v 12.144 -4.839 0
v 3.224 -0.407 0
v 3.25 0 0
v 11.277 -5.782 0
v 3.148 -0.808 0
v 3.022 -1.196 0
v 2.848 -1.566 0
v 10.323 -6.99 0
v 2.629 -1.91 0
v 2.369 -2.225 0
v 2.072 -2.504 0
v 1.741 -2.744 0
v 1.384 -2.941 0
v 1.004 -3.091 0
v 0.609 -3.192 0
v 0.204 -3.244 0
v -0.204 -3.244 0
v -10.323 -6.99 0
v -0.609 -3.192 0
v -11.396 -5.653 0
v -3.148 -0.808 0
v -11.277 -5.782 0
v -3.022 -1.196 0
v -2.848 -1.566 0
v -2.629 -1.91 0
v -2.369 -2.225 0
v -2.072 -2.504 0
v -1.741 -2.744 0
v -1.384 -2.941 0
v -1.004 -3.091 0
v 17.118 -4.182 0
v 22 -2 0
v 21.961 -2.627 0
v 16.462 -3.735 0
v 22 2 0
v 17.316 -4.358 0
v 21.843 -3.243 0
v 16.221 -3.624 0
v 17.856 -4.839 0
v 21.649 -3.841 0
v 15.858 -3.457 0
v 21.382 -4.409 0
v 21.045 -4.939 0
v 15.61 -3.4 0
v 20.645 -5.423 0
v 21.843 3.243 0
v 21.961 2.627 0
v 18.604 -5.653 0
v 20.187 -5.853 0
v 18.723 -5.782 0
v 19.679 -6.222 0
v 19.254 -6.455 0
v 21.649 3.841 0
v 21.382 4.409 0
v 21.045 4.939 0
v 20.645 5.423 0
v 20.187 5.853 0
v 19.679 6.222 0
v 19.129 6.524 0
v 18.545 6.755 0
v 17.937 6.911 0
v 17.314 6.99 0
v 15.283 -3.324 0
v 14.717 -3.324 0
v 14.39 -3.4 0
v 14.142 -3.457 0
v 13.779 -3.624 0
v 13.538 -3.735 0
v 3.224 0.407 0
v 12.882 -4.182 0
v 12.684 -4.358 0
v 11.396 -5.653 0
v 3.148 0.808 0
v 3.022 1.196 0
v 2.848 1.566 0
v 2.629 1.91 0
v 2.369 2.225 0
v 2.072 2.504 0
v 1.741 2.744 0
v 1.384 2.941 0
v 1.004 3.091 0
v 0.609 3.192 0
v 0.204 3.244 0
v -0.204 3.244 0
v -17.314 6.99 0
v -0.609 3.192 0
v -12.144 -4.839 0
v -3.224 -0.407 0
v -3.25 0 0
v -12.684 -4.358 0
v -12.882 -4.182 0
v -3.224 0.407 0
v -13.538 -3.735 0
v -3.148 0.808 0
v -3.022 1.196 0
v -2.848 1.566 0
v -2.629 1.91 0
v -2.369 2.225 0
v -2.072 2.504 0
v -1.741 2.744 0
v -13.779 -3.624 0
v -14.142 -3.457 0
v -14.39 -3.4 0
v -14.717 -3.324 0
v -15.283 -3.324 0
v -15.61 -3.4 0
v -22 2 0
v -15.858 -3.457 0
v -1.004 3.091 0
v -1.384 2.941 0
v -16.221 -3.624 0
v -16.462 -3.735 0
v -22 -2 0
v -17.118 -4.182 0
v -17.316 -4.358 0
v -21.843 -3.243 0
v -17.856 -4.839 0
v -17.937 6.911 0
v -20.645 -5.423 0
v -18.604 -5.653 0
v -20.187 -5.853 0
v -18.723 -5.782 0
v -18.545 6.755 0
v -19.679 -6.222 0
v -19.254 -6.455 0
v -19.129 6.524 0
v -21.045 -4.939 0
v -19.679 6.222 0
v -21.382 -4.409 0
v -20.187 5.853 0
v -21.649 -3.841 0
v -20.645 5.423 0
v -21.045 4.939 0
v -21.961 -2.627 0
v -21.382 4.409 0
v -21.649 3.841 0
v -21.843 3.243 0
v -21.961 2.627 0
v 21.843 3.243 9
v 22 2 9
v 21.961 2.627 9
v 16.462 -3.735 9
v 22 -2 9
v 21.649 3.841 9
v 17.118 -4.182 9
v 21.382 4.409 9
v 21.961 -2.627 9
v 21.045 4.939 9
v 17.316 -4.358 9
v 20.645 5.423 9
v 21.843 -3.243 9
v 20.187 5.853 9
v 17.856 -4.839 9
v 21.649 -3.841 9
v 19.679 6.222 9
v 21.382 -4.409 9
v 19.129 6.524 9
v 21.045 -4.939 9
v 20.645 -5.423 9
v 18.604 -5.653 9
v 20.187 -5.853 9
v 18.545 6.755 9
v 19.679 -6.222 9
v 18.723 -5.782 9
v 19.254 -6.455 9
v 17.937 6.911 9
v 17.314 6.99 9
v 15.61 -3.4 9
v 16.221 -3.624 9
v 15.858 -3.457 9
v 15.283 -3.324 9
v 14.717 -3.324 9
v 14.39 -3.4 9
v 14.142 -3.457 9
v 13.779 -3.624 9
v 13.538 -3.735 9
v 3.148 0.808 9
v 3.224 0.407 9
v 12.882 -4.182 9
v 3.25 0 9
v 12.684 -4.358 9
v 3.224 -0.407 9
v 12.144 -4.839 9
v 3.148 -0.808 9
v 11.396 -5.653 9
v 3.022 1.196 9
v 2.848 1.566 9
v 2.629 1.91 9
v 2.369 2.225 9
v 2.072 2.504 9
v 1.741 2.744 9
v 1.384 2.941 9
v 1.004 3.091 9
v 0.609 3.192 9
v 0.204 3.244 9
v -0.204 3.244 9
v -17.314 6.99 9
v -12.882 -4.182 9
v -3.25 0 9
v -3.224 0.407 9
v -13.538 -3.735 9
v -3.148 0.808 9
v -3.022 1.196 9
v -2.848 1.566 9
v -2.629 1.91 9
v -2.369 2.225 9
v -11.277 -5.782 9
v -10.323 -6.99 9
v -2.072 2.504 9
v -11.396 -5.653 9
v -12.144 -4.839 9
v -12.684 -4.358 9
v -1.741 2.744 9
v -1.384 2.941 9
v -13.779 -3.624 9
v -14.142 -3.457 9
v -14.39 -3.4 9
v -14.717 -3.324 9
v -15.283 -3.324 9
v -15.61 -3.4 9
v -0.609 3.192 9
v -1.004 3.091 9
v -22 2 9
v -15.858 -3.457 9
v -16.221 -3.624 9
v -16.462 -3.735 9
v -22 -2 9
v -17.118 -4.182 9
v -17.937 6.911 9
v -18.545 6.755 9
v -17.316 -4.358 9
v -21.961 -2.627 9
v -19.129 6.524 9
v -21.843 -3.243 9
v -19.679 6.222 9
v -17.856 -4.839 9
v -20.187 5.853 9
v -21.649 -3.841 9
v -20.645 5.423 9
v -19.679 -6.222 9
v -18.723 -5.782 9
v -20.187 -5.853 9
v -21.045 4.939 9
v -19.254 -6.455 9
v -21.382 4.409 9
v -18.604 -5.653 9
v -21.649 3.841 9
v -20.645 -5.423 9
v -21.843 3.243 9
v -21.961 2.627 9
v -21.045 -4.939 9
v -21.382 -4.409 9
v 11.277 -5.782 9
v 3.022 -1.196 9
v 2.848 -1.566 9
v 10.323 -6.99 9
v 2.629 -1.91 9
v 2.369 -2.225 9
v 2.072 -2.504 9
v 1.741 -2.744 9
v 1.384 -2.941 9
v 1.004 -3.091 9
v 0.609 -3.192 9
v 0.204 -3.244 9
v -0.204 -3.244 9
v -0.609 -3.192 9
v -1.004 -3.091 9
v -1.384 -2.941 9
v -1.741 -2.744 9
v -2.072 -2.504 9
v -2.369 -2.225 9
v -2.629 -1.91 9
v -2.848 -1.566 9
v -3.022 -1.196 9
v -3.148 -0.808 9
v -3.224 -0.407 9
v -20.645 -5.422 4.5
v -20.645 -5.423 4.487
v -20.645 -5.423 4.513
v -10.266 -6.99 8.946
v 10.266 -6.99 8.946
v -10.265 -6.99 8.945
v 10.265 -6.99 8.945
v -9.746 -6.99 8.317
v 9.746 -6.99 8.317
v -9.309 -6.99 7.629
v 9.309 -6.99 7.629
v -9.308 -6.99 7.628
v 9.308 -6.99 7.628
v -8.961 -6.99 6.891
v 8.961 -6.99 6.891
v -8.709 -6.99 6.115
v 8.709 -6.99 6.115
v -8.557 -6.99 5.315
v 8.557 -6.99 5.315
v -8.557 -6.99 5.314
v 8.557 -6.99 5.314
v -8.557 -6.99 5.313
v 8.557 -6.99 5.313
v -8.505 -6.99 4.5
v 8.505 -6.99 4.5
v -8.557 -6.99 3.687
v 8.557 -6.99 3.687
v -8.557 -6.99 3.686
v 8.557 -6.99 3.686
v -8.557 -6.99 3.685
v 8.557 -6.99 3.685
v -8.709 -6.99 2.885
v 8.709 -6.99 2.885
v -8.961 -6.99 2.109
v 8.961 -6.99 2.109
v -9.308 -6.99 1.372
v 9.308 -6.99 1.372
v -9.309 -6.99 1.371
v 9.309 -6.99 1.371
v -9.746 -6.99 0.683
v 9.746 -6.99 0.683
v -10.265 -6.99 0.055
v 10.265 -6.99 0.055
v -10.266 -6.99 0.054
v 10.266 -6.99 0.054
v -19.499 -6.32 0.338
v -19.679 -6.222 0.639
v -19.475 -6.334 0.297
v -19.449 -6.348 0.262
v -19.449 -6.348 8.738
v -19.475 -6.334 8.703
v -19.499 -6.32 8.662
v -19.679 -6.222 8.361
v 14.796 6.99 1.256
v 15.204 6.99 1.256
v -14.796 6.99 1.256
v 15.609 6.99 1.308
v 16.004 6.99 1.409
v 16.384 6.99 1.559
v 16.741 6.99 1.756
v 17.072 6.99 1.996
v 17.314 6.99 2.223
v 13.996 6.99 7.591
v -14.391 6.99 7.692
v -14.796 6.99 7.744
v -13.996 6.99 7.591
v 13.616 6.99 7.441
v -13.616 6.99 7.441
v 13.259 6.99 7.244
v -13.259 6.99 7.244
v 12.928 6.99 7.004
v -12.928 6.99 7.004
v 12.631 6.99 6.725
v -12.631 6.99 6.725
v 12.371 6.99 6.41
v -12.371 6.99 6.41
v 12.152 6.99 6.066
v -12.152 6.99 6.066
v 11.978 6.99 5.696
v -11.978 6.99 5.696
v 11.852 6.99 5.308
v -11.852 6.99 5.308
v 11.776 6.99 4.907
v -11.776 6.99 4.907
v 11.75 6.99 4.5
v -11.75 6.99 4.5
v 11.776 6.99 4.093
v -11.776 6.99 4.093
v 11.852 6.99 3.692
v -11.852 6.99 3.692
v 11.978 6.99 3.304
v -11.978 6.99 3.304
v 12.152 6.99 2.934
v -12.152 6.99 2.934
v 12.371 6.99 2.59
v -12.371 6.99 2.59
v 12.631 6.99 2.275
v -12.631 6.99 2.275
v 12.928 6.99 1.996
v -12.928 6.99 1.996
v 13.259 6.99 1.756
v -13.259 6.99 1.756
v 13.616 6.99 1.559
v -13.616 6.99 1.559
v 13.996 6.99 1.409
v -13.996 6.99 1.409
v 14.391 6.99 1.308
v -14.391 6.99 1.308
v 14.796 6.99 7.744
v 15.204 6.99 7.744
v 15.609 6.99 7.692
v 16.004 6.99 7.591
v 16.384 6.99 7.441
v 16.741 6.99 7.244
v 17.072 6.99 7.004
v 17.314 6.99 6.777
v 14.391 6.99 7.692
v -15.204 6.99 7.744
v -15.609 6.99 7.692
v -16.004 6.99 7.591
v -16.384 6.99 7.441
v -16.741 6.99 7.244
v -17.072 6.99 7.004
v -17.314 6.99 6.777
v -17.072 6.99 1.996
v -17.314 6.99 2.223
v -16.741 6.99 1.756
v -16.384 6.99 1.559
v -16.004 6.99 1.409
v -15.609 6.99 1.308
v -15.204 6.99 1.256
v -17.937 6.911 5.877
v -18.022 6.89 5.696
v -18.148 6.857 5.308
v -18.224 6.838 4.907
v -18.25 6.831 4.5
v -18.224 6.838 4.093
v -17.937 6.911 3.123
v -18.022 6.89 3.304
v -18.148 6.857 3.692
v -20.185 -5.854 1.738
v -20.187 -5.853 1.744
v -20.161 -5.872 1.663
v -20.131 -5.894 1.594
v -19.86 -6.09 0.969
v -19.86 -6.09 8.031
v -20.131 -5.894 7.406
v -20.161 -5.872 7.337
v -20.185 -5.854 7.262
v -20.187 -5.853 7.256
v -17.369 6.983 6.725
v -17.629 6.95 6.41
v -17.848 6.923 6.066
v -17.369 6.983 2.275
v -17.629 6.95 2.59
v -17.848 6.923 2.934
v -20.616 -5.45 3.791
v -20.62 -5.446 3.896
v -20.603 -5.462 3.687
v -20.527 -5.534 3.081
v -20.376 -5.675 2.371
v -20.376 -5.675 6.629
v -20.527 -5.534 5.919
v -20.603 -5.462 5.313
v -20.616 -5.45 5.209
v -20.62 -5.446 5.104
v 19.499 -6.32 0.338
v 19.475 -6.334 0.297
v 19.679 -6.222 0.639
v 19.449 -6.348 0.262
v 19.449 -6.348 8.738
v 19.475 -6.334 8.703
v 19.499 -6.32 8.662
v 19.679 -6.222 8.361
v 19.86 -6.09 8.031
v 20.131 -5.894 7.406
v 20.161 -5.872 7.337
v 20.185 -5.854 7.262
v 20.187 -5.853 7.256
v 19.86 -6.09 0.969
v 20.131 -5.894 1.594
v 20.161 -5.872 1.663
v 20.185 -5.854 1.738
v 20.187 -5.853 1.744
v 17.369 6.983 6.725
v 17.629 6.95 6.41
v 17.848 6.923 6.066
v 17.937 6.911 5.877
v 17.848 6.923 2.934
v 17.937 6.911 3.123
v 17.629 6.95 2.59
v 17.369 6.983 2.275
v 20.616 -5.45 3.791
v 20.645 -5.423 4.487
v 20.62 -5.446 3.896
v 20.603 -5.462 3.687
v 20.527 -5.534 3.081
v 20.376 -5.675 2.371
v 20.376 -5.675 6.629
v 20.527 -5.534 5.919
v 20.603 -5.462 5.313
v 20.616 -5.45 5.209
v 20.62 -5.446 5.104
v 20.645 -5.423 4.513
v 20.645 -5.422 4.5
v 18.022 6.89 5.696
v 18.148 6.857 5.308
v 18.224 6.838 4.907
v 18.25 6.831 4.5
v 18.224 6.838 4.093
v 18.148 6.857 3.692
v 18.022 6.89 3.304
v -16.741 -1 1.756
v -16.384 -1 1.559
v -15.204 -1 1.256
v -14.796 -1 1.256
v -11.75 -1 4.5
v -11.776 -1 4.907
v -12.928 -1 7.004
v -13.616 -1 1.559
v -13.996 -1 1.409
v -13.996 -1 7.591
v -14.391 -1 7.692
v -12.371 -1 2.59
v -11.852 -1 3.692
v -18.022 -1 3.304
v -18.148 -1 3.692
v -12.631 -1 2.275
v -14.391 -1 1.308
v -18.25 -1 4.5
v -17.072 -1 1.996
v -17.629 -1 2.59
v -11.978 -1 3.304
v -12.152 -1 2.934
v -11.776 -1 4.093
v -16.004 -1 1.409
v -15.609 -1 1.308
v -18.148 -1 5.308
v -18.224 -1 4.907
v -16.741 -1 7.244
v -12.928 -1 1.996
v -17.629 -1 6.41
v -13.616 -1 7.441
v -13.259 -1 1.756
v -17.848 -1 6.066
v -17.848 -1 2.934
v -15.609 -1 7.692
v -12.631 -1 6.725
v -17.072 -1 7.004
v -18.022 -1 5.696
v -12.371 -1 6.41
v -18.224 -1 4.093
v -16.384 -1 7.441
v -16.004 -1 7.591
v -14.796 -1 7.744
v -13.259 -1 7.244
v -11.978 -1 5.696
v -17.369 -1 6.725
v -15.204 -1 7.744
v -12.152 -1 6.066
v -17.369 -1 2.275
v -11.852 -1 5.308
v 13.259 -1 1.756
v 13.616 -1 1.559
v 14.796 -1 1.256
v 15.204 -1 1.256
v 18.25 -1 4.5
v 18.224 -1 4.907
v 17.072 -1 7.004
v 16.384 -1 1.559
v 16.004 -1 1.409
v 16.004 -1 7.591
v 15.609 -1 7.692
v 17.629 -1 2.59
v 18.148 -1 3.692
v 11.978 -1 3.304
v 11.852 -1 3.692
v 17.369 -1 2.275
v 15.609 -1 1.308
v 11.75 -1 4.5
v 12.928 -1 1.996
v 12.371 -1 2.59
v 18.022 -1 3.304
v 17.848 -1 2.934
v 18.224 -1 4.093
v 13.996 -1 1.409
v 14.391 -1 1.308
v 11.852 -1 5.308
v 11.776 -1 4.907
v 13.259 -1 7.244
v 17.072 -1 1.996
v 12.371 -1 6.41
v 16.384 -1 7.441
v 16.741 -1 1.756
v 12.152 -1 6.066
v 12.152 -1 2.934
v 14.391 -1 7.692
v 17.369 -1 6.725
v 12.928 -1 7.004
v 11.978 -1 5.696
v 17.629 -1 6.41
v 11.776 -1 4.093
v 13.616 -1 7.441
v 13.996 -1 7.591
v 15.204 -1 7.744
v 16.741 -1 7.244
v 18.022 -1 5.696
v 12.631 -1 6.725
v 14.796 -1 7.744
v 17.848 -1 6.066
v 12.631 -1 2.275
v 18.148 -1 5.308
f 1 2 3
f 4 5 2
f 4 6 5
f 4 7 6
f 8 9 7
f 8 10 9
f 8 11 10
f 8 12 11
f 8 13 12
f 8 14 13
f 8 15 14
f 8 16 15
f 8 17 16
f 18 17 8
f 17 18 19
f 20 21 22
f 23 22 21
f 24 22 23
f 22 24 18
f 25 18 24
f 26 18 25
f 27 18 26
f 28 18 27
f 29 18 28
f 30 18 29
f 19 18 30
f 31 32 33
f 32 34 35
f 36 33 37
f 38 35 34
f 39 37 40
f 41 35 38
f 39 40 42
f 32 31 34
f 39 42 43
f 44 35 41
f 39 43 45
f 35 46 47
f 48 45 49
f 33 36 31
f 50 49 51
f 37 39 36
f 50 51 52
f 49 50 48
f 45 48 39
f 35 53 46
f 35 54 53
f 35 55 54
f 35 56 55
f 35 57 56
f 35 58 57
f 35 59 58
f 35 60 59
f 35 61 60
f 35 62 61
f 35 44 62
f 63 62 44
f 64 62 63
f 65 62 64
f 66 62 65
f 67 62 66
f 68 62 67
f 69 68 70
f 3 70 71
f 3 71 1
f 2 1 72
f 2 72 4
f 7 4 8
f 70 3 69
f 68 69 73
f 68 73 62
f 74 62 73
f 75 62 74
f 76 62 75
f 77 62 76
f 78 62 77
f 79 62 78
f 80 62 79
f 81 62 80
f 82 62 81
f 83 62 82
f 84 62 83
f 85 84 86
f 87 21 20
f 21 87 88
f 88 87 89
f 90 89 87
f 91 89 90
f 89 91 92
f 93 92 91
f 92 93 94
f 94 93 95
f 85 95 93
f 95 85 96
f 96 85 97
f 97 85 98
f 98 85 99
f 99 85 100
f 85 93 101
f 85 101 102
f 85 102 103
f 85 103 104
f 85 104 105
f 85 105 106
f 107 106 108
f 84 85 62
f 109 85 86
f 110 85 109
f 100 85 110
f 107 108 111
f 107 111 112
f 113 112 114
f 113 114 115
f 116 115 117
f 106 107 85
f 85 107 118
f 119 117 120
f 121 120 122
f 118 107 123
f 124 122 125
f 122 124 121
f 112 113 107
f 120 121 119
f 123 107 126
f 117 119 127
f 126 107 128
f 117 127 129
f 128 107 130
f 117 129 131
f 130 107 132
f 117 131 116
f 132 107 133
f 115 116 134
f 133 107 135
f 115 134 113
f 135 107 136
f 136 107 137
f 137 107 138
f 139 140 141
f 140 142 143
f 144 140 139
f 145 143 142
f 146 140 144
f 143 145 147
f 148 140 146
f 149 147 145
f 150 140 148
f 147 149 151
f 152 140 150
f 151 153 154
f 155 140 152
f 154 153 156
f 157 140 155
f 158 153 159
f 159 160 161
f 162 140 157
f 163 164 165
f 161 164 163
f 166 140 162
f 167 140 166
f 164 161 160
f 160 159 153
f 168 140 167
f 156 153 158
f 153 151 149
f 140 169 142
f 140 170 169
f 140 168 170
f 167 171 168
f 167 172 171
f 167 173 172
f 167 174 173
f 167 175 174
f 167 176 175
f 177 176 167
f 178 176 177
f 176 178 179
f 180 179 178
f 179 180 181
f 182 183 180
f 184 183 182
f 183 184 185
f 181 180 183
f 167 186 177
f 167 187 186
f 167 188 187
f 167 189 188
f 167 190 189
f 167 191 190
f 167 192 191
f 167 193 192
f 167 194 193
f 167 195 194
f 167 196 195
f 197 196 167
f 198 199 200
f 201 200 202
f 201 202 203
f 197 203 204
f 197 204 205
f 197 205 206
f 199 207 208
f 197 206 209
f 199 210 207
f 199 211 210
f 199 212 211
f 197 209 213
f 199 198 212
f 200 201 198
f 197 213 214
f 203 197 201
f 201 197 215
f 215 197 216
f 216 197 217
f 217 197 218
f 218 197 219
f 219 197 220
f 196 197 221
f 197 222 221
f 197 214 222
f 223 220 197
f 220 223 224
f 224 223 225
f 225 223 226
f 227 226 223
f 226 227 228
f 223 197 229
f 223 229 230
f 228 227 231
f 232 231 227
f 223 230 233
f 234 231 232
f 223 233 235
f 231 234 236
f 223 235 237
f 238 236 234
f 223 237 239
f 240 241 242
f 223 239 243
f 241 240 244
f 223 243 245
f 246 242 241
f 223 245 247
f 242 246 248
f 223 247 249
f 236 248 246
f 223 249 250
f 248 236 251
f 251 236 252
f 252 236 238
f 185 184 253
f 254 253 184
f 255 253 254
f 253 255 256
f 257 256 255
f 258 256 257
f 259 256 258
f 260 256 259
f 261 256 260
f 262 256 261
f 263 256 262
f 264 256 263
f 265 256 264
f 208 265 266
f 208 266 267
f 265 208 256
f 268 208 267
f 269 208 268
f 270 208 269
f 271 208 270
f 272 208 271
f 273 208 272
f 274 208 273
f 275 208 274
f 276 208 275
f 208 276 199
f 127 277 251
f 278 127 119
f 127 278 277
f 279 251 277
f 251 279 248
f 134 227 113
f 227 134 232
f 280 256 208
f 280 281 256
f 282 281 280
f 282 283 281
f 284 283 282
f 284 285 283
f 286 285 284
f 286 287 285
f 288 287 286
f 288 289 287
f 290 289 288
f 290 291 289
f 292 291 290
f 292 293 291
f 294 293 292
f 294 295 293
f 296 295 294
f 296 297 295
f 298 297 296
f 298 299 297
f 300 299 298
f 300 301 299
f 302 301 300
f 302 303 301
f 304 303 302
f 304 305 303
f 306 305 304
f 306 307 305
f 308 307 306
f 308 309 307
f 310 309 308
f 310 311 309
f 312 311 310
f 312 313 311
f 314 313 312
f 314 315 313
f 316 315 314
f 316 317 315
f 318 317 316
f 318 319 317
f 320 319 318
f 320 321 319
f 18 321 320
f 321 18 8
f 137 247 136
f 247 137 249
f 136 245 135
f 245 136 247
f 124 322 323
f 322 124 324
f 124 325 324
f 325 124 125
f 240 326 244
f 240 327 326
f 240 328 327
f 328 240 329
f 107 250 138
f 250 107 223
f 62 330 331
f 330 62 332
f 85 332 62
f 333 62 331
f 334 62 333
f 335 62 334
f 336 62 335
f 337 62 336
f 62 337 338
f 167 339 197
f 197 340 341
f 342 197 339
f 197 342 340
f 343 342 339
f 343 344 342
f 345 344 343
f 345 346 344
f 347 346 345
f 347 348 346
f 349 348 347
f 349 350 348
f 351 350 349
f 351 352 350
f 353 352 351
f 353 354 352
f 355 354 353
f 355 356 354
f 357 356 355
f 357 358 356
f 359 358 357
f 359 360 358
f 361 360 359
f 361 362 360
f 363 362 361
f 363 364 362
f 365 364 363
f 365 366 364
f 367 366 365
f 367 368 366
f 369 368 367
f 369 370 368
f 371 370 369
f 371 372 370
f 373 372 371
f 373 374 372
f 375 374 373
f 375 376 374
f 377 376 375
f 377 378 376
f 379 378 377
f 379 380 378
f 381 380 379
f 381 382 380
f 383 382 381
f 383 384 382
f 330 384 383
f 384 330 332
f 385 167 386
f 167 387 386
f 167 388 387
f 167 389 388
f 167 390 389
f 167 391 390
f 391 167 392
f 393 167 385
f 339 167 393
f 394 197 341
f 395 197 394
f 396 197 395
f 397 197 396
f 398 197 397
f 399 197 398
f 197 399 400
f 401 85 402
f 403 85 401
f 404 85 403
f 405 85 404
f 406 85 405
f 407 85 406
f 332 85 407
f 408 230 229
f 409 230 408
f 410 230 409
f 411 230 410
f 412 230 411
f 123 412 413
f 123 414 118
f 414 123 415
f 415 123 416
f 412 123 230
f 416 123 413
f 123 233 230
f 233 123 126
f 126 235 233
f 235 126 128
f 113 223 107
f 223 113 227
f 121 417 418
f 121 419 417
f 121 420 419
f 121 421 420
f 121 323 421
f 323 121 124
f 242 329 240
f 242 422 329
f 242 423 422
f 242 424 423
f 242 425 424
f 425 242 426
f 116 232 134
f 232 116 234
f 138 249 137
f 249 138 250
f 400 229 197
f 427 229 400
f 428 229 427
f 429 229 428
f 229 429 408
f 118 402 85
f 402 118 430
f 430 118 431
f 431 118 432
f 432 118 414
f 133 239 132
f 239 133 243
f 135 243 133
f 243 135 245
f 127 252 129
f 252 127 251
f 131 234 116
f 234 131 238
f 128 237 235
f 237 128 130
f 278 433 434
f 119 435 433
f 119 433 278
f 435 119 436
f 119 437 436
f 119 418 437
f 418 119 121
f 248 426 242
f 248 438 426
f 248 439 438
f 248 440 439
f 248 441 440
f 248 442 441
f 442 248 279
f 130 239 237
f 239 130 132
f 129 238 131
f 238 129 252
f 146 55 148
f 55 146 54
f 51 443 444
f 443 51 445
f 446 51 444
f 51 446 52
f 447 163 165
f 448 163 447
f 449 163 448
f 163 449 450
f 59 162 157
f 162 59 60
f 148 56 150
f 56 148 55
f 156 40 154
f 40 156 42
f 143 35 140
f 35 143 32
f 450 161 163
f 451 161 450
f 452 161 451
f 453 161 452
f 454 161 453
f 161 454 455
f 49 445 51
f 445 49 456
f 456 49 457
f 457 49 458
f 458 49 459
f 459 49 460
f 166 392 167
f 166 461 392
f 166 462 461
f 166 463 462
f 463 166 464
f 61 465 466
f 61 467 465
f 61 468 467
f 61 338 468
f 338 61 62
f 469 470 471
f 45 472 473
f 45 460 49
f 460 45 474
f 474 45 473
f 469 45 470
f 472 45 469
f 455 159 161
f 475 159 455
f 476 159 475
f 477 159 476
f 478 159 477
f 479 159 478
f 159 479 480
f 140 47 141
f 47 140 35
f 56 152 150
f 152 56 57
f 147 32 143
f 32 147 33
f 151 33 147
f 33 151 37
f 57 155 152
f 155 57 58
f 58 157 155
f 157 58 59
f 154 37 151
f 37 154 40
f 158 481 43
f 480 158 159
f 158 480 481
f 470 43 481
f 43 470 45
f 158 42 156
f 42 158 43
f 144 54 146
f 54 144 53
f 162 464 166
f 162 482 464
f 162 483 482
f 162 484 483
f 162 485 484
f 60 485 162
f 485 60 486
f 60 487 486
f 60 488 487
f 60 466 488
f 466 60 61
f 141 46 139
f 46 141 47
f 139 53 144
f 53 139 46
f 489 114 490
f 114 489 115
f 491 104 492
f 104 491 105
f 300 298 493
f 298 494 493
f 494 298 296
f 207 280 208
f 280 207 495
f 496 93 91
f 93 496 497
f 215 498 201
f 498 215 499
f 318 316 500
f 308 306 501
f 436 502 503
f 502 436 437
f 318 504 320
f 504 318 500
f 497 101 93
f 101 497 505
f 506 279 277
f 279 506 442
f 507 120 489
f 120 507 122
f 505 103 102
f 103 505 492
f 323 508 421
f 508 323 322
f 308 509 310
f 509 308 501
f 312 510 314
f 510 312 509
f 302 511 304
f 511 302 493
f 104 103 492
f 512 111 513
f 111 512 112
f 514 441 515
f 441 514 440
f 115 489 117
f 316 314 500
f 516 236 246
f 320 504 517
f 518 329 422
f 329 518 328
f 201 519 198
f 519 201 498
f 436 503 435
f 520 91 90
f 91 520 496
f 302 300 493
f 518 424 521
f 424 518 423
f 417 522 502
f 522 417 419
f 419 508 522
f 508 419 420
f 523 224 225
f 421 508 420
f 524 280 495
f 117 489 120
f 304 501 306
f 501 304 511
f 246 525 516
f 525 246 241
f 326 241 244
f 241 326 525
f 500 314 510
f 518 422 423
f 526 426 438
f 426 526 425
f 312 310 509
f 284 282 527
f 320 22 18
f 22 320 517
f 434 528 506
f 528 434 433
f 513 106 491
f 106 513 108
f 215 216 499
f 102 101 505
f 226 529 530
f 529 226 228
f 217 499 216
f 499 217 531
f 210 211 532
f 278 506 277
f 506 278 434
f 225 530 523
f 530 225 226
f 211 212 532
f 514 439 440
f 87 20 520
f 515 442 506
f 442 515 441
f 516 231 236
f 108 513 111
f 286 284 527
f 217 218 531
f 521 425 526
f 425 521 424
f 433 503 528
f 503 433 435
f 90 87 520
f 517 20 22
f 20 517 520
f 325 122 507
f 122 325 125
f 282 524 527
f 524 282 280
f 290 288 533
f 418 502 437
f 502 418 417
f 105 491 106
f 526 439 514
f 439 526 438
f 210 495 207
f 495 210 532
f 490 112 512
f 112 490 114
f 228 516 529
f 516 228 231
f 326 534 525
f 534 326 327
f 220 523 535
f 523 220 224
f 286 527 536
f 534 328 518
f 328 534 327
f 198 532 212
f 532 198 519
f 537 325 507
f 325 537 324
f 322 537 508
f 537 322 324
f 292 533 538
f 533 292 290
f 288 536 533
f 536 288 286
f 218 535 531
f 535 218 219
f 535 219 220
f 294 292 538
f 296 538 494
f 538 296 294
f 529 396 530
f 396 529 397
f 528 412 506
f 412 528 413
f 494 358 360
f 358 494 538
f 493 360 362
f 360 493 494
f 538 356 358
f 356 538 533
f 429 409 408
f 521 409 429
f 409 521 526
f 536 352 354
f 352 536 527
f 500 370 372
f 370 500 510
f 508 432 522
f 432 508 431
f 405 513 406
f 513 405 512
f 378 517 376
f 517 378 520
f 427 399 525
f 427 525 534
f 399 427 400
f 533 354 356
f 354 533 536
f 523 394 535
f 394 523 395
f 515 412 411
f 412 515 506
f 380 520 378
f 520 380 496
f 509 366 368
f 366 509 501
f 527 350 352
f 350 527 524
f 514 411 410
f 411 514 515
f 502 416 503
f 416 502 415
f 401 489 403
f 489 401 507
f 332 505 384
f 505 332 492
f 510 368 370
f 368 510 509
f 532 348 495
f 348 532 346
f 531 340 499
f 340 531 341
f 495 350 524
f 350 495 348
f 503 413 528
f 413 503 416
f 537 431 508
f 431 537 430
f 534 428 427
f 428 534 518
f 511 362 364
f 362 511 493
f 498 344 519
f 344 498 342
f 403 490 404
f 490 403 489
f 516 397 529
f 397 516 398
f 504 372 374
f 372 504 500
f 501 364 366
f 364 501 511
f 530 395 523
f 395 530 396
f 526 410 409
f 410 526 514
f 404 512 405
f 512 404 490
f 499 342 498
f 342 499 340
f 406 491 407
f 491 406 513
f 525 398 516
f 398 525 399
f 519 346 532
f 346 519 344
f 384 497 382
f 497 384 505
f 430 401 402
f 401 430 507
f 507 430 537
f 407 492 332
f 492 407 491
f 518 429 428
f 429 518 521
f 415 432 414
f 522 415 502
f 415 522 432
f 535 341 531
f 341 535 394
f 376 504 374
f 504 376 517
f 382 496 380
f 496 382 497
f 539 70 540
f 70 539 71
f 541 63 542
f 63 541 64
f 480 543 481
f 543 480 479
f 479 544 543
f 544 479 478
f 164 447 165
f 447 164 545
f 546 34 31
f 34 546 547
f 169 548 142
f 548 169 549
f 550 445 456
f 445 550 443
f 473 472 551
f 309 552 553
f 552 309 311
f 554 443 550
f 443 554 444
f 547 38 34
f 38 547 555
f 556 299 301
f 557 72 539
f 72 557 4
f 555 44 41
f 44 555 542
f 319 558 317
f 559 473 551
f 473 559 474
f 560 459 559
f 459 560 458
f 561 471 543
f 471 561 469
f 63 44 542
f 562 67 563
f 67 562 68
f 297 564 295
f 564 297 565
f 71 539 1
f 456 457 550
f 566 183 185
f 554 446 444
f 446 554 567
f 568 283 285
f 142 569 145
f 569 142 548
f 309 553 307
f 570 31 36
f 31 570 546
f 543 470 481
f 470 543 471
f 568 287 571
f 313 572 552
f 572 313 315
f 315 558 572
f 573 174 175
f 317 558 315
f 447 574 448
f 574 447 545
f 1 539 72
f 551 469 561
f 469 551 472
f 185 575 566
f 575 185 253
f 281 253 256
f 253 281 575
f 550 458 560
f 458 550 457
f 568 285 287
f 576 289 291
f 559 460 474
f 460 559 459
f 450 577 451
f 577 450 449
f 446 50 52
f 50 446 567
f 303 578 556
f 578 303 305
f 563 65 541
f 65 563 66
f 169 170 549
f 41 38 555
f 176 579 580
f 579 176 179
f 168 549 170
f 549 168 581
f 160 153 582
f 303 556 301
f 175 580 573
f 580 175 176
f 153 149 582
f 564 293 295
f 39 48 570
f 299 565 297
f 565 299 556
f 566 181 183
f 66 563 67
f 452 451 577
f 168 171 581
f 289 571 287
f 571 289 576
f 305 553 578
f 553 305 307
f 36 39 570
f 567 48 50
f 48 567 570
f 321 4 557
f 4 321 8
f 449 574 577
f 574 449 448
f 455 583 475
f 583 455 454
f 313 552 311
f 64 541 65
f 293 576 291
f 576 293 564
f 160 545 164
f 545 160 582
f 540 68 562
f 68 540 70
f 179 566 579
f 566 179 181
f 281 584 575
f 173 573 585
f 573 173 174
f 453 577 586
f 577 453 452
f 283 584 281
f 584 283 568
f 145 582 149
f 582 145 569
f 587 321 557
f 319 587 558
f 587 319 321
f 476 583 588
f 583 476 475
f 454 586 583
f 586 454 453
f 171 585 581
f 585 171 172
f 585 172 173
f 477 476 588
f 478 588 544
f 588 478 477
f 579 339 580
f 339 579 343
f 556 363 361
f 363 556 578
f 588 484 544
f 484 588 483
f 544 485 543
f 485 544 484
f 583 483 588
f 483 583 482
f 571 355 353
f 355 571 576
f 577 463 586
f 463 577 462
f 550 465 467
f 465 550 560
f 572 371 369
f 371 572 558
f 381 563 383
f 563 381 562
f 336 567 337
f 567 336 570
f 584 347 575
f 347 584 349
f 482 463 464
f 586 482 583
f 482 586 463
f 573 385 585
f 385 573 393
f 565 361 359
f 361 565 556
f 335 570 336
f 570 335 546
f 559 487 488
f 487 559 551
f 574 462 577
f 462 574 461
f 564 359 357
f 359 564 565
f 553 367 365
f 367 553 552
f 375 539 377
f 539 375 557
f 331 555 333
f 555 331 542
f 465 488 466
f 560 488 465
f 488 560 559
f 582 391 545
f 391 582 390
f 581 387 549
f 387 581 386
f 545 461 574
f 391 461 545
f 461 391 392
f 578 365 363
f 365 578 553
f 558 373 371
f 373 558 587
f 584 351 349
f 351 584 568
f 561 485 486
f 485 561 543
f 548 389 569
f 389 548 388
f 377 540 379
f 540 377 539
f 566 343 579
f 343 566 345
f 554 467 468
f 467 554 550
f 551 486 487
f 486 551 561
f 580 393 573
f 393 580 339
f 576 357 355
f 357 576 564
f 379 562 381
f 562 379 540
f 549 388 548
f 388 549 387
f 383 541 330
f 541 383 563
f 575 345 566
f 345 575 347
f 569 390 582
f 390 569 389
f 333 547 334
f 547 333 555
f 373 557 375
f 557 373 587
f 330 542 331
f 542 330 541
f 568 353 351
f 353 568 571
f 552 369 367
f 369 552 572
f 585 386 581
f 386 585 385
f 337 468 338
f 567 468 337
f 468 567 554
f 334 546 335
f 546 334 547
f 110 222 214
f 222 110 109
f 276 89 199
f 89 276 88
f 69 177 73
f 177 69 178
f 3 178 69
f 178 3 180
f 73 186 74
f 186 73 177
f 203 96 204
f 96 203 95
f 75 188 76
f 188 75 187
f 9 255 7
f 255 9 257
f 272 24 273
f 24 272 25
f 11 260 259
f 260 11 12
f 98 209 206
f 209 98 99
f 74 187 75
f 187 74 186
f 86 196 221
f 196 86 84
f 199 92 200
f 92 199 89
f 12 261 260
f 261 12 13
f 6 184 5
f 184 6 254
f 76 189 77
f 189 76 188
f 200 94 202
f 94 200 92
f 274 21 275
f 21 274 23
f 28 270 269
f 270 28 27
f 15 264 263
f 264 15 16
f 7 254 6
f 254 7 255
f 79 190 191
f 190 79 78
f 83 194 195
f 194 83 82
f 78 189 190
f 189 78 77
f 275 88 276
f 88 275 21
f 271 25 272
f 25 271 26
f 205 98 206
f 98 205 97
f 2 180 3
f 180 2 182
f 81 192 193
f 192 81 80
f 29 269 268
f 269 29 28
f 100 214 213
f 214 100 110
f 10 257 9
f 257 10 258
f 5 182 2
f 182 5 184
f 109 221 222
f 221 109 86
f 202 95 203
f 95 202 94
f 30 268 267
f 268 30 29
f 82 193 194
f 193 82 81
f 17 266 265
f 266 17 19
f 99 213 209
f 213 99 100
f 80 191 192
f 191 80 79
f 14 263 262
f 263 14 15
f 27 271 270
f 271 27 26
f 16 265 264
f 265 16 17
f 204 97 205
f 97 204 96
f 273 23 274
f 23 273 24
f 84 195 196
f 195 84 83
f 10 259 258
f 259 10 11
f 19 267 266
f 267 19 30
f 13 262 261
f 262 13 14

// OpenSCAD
$fn = 50;


difference() {
	union() {
		cylinder(h = 9, r = 7.0000000000);
		translate(v = [-7.5000000000, 0.0000000000, 0]) {
			hull() {
				translate(v = [-9.5000000000, 2.0000000000, 0]) {
					cylinder(h = 9, r = 5);
				}
				translate(v = [9.5000000000, 2.0000000000, 0]) {
					cylinder(h = 9, r = 5);
				}
				translate(v = [-9.5000000000, -2.0000000000, 0]) {
					cylinder(h = 9, r = 5);
				}
				translate(v = [9.5000000000, -2.0000000000, 0]) {
					cylinder(h = 9, r = 5);
				}
			}
		}
		translate(v = [-7.5000000000, 0.0000000000, 0]) {
			hull() {
				translate(v = [-9.5000000000, 2.0000000000, 0]) {
					cylinder(h = 9, r = 5);
				}
				translate(v = [9.5000000000, 2.0000000000, 0]) {
					cylinder(h = 9, r = 5);
				}
				translate(v = [-9.5000000000, -2.0000000000, 0]) {
					cylinder(h = 9, r = 5);
				}
				translate(v = [9.5000000000, -2.0000000000, 0]) {
					cylinder(h = 9, r = 5);
				}
			}
		}
		translate(v = [7.5000000000, 0.0000000000, 0]) {
			hull() {
				translate(v = [-9.5000000000, 2.0000000000, 0]) {
					cylinder(h = 9, r = 5);
				}
				translate(v = [9.5000000000, 2.0000000000, 0]) {
					cylinder(h = 9, r = 5);
				}
				translate(v = [-9.5000000000, -2.0000000000, 0]) {
					cylinder(h = 9, r = 5);
				}
				translate(v = [9.5000000000, -2.0000000000, 0]) {
					cylinder(h = 9, r = 5);
				}
			}
		}
		translate(v = [7.5000000000, 0.0000000000, 0]) {
			hull() {
				translate(v = [-9.5000000000, 2.0000000000, 0]) {
					cylinder(h = 9, r = 5);
				}
				translate(v = [9.5000000000, 2.0000000000, 0]) {
					cylinder(h = 9, r = 5);
				}
				translate(v = [-9.5000000000, -2.0000000000, 0]) {
					cylinder(h = 9, r = 5);
				}
				translate(v = [9.5000000000, -2.0000000000, 0]) {
					cylinder(h = 9, r = 5);
				}
			}
		}
	}
	union() {
		translate(v = [-15.0000000000, -7.0000000000, 4.5000000000]) {
			rotate(a = [90, 0, 0]) {
				difference() {
					union() {
						#translate(v = [0, 0, -14.0000000000]) {
							cylinder(h = 14, r = 2.2500000000);
						}
						#translate(v = [0, 0, -6]) {
							cylinder(h = 6, r1 = 3.2500000000, r2 = 6.5000000000);
						}
						#translate(v = [0, 0, -14.0000000000]) {
							cylinder(h = 14, r = 3.2500000000);
						}
						#translate(v = [0, 0, -14.0000000000]) {
							cylinder(h = 14, r = 2.2500000000);
						}
					}
					union();
				}
			}
		}
		translate(v = [15.0000000000, -7.0000000000, 4.5000000000]) {
			rotate(a = [90, 0, 0]) {
				difference() {
					union() {
						#translate(v = [0, 0, -14.0000000000]) {
							cylinder(h = 14, r = 2.2500000000);
						}
						#translate(v = [0, 0, -6]) {
							cylinder(h = 6, r1 = 3.2500000000, r2 = 6.5000000000);
						}
						#translate(v = [0, 0, -14.0000000000]) {
							cylinder(h = 14, r = 3.2500000000);
						}
						#translate(v = [0, 0, -14.0000000000]) {
							cylinder(h = 14, r = 2.2500000000);
						}
					}
					union();
				}
			}
		}
		translate(v = [0, 0, -100]) {
			cylinder(h = 200, r = 3.2500000000);
		}
		translate(v = [0, 0, -100]) {
			cylinder(h = 200, r = 1.8000000000);
		}
	}
}
